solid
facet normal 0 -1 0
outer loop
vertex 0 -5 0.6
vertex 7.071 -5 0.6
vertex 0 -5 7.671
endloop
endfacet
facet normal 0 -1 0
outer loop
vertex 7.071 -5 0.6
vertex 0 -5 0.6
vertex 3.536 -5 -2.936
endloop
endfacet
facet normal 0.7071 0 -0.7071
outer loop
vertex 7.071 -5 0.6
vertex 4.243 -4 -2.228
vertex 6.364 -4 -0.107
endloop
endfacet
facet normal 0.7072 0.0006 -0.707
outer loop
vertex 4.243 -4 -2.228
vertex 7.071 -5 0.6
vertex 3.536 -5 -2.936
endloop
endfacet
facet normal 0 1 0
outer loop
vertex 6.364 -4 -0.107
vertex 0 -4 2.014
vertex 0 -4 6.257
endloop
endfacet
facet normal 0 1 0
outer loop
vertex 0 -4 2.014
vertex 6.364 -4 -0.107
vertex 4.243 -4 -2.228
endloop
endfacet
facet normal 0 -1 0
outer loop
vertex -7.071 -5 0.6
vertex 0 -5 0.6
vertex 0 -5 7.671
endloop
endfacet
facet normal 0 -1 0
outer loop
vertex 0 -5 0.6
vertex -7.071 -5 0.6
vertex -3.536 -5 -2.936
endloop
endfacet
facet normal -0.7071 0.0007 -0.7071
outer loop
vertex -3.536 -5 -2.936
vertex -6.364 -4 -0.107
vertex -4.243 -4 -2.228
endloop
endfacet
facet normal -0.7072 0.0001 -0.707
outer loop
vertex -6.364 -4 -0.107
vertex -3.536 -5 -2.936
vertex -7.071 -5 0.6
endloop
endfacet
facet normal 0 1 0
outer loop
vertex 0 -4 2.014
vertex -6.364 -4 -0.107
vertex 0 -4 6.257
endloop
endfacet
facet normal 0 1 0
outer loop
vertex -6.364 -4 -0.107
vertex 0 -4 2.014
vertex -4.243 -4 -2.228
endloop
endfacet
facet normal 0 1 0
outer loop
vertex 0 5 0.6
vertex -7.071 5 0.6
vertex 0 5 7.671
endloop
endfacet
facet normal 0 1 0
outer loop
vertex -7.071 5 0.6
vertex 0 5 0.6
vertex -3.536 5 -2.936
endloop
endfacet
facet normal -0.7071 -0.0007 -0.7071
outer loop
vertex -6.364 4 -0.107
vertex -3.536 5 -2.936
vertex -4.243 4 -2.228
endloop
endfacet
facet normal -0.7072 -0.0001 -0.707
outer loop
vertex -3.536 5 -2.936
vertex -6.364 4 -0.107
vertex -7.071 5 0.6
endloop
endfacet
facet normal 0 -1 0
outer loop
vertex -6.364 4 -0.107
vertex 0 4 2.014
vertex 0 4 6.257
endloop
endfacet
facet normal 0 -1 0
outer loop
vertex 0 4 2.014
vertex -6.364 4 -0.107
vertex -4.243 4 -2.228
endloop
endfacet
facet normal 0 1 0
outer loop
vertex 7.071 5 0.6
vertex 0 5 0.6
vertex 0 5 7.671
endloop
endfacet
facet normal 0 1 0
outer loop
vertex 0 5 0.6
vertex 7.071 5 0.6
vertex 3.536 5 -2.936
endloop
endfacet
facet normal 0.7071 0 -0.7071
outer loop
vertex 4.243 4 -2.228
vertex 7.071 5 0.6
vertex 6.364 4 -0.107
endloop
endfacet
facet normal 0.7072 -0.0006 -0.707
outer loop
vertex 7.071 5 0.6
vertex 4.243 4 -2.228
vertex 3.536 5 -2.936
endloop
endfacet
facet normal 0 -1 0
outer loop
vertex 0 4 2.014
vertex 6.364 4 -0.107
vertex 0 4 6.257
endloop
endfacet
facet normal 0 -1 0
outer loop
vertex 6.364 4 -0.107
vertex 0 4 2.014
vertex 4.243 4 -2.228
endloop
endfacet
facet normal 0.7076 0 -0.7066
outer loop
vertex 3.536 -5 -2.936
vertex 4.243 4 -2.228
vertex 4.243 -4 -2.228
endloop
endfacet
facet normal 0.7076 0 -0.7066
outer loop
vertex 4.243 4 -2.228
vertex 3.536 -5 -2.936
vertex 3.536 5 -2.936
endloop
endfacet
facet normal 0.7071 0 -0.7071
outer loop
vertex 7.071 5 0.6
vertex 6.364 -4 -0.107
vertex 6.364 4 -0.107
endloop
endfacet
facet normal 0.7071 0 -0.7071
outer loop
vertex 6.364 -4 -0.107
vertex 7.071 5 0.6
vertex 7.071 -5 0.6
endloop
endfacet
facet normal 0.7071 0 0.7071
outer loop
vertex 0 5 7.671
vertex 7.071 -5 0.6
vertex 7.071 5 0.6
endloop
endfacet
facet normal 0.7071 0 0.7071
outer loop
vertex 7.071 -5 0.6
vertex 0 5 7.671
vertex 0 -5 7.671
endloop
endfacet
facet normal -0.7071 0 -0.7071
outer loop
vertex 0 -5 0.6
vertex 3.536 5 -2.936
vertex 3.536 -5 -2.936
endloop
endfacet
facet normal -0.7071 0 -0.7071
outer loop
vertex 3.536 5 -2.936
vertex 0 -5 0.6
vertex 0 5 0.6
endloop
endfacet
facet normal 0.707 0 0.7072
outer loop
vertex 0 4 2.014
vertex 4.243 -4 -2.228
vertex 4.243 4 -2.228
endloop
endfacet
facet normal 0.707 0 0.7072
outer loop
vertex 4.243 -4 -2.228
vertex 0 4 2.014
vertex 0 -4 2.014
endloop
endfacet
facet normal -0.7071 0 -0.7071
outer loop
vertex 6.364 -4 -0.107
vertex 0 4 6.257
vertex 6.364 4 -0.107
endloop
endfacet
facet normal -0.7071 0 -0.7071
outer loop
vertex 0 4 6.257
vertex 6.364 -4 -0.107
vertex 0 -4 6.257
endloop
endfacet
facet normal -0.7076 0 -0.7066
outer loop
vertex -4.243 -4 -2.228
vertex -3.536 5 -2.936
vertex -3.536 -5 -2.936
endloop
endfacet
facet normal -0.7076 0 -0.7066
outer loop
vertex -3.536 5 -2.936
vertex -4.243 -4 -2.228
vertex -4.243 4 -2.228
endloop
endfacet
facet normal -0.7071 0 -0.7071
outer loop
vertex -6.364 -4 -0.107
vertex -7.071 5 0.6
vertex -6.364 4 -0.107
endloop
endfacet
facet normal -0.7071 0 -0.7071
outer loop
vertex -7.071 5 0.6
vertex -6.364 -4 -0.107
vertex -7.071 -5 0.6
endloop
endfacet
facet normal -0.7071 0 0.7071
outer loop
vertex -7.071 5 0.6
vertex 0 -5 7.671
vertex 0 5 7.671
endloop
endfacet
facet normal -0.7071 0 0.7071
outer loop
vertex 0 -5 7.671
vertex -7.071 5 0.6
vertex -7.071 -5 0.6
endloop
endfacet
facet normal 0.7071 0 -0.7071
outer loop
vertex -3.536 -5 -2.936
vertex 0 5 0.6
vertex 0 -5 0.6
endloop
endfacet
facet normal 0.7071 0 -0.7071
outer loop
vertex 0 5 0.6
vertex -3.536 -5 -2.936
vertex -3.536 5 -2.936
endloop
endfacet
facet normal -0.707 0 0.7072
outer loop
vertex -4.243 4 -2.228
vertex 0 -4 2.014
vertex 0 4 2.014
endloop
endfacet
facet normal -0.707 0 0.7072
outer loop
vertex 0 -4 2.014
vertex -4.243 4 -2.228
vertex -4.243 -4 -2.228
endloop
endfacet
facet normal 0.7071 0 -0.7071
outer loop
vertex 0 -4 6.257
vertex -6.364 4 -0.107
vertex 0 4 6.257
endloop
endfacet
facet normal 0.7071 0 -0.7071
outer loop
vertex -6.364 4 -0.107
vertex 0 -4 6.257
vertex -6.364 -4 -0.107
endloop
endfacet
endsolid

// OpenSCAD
// file: s/u7044s01.scad
use <../../lib.scad>
function ldraw_lib__s__u7044s01() = [
// 0 ~Modulex Angled Brick 45 2 x 1 Double - Side
// 0 Name: s\u7044s01.dat
// 0 Author: Magnus Forsberg [MagFors]
// 0 !LDRAW_ORG Subpart UPDATE 2025-09
// 0 !LICENSE Licensed under CC BY 4.0 : see CAreadme.txt
// 
// 0 BFC CERTIFY CCW
  [0,"BFC","CERTIFY"],
  [0,"BFC","CCW"],
// 
// 0 !HISTORY 2025-09-29 [OrionP] Official Update 2025-09
// 
// 4 16 0 -19.177697 0 0 -1.5 0 8.838835 7.338807 0 17.677676 -1.500028 0
  [4,16,0,-19.177697,0,0,-1.5,0,8.838835,7.338807,0,17.677676,-1.500028,0],
// 4 16 8.838835 7.338807 0 10.606609 5.57104 2.5 15.909909 .267739 2.5 17.677676 -1.500028 0
  [4,16,8.838835,7.338807,0,10.606609,5.57104,2.5,15.909909,.267739,2.5,17.677676,-1.500028,0],
// 4 16 0 -5.035568 2.5 0 -15.64217 2.5 15.909909 .267739 2.5 10.606609 5.57104 2.5
  [4,16,0,-5.035568,2.5,0,-15.64217,2.5,15.909909,.267739,2.5,10.606609,5.57104,2.5],
// 2 24 10.606609 5.57104 2.5 15.909909 .267739 2.5
  [2,24,10.606609,5.57104,2.5,15.909909,.267739,2.5],
// 2 24 17.677676 -1.500028 0 8.838835 7.338807 0
  [2,24,17.677676,-1.500028,0,8.838835,7.338807,0],
// 2 24 8.838835 7.338807 0 0 -1.5 0
  [2,24,8.838835,7.338807,0,0,-1.5,0],
// 2 24 0 -5.035568 2.5 10.606609 5.57104 2.5
  [2,24,0,-5.035568,2.5,10.606609,5.57104,2.5],
// 2 24 0 -15.64217 2.5 15.909909 .267739 2.5
  [2,24,0,-15.64217,2.5,15.909909,.267739,2.5],
// 2 24 0 -19.177697 0 17.677676 -1.500028 0
  [2,24,0,-19.177697,0,17.677676,-1.500028,0],
// 4 16 -8.838835 7.338807 0 0 -1.5 0 0 -19.177697 0 -17.677676 -1.500028 0
  [4,16,-8.838835,7.338807,0,0,-1.5,0,0,-19.177697,0,-17.677676,-1.500028,0],
// 4 16 -15.909909 .267739 2.5 -10.606609 5.57104 2.5 -8.838835 7.338807 0 -17.677676 -1.500028 0
  [4,16,-15.909909,.267739,2.5,-10.606609,5.57104,2.5,-8.838835,7.338807,0,-17.677676,-1.500028,0],
// 4 16 -15.909909 .267739 2.5 0 -15.64217 2.5 0 -5.035568 2.5 -10.606609 5.57104 2.5
  [4,16,-15.909909,.267739,2.5,0,-15.64217,2.5,0,-5.035568,2.5,-10.606609,5.57104,2.5],
// 2 24 -15.909909 .267739 2.5 -10.606609 5.57104 2.5
  [2,24,-15.909909,.267739,2.5,-10.606609,5.57104,2.5],
// 2 24 -8.838835 7.338807 0 -17.677676 -1.500028 0
  [2,24,-8.838835,7.338807,0,-17.677676,-1.500028,0],
// 2 24 0 -1.5 0 -8.838835 7.338807 0
  [2,24,0,-1.5,0,-8.838835,7.338807,0],
// 2 24 -10.606609 5.57104 2.5 0 -5.035568 2.5
  [2,24,-10.606609,5.57104,2.5,0,-5.035568,2.5],
// 2 24 -15.909909 .267739 2.5 0 -15.64217 2.5
  [2,24,-15.909909,.267739,2.5,0,-15.64217,2.5],
// 2 24 -17.677676 -1.500028 0 0 -19.177697 0
  [2,24,-17.677676,-1.500028,0,0,-19.177697,0],
];
module ldraw_lib__s__u7044s01(step=0, col=false, unit=2/5, alt=false, line=0.2, solid=!$preview)
    makepoly(ldraw_lib__s__u7044s01(), step=step, col=col, unit=unit, alt=alt, line=line, solid=solid);
ldraw_lib__s__u7044s01(line=0.2);
// main file
use <../lib.scad>
use <s/u7044s01.scad>
function ldraw_lib__u7045() = [
// 0 Modulex Brick Angled 45 2 x 2 Double
// 0 Name: u7045.dat
// 0 Author: Magnus Forsberg [MagFors]
// 0 !LDRAW_ORG Part UPDATE 2025-09
// 0 !LICENSE Licensed under CC BY 4.0 : see CAreadme.txt
// 
// 0 !HELP 1 16 6.25 12.5 0 1 0 0 0 1 0 0 0 1 u7030.dat
// 0 !HELP 1 35 13.258 2.919 0 0 .707 .707 0 .707 -.707 -1 0 0 u7001.dat
// 
// 0 BFC CERTIFY CCW
  [0,"BFC","CERTIFY"],
  [0,"BFC","CCW"],
// 
// 0 !KEYWORDS 45 degree, Bricklink Mx2401B, Rebrickable 2401B, slope 1:1
// 
// 0 !HISTORY 2025-09-29 [OrionP] Official Update 2025-09
// 
// 1 16 0 0 -12.5 1 0 0 0 1 0 0 0 1 s\u7044s01.dat
  [1,16,0,0,-12.5,1,0,0,0,1,0,0,0,1, ldraw_lib__s__u7044s01()],
// 1 16 0 0 12.5 -1 0 0 0 1 0 0 0 -1 s\u7044s01.dat
  [1,16,0,0,12.5,-1,0,0,0,1,0,0,0,-1, ldraw_lib__s__u7044s01()],
// 
// 2 24 0 -5.035568 -10 0 -5.035568 10
  [2,24,0,-5.035568,-10,0,-5.035568,10],
// 2 24 0 -15.64217 10 0 -15.64217 -10
  [2,24,0,-15.64217,10,0,-15.64217,-10],
// 2 24 0 -19.177697 12.5 0 -19.177697 -12.5
  [2,24,0,-19.177697,12.5,0,-19.177697,-12.5],
// 2 24 0 -1.5 -12.5 0 -1.5 12.5
  [2,24,0,-1.5,-12.5,0,-1.5,12.5],
// 
// 4 16 8.838835 7.338807 -12.5 8.838835 7.338807 12.5 10.606609 5.57104 10 10.606609 5.57104 -10
  [4,16,8.838835,7.338807,-12.5,8.838835,7.338807,12.5,10.606609,5.57104,10,10.606609,5.57104,-10],
// 4 16 17.677676 -1.500028 -12.5 15.909909 .267739 -10 15.909909 .267739 10 17.677676 -1.500028 12.5
  [4,16,17.677676,-1.500028,-12.5,15.909909,.267739,-10,15.909909,.267739,10,17.677676,-1.500028,12.5],
// 4 16 17.677676 -1.500028 -12.5 17.677676 -1.500028 12.5 0 -19.177697 12.5 0 -19.177697 -12.5
  [4,16,17.677676,-1.500028,-12.5,17.677676,-1.500028,12.5,0,-19.177697,12.5,0,-19.177697,-12.5],
// 4 16 0 -1.5 12.5 8.838835 7.338807 12.5 8.838835 7.338807 -12.5 0 -1.5 -12.5
  [4,16,0,-1.5,12.5,8.838835,7.338807,12.5,8.838835,7.338807,-12.5,0,-1.5,-12.5],
// 4 16 0 -5.035568 10 0 -5.035568 -10 10.606609 5.57104 -10 10.606609 5.57104 10
  [4,16,0,-5.035568,10,0,-5.035568,-10,10.606609,5.57104,-10,10.606609,5.57104,10],
// 4 16 0 -15.64217 10 15.909909 .267739 10 15.909909 .267739 -10 0 -15.64217 -10
  [4,16,0,-15.64217,10,15.909909,.267739,10,15.909909,.267739,-10,0,-15.64217,-10],
// 2 24 17.677676 -1.500028 -12.5 17.677676 -1.500028 12.5
  [2,24,17.677676,-1.500028,-12.5,17.677676,-1.500028,12.5],
// 2 24 15.909909 .267739 -10 15.909909 .267739 10
  [2,24,15.909909,.267739,-10,15.909909,.267739,10],
// 2 24 8.838835 7.338807 -12.5 8.838835 7.338807 12.5
  [2,24,8.838835,7.338807,-12.5,8.838835,7.338807,12.5],
// 2 24 10.606609 5.57104 10 10.606609 5.57104 -10
  [2,24,10.606609,5.57104,10,10.606609,5.57104,-10],
// 
// 4 16 -10.606609 5.57104 10 -8.838835 7.338807 12.5 -8.838835 7.338807 -12.5 -10.606609 5.57104 -10
  [4,16,-10.606609,5.57104,10,-8.838835,7.338807,12.5,-8.838835,7.338807,-12.5,-10.606609,5.57104,-10],
// 4 16 -15.909909 .267739 10 -15.909909 .267739 -10 -17.677676 -1.500028 -12.5 -17.677676 -1.500028 12.5
  [4,16,-15.909909,.267739,10,-15.909909,.267739,-10,-17.677676,-1.500028,-12.5,-17.677676,-1.500028,12.5],
// 4 16 0 -19.177697 12.5 -17.677676 -1.500028 12.5 -17.677676 -1.500028 -12.5 0 -19.177697 -12.5
  [4,16,0,-19.177697,12.5,-17.677676,-1.500028,12.5,-17.677676,-1.500028,-12.5,0,-19.177697,-12.5],
// 4 16 -8.838835 7.338807 -12.5 -8.838835 7.338807 12.5 0 -1.5 12.5 0 -1.5 -12.5
  [4,16,-8.838835,7.338807,-12.5,-8.838835,7.338807,12.5,0,-1.5,12.5,0,-1.5,-12.5],
// 4 16 -10.606609 5.57104 -10 0 -5.035568 -10 0 -5.035568 10 -10.606609 5.57104 10
  [4,16,-10.606609,5.57104,-10,0,-5.035568,-10,0,-5.035568,10,-10.606609,5.57104,10],
// 4 16 -15.909909 .267739 -10 -15.909909 .267739 10 0 -15.64217 10 0 -15.64217 -10
  [4,16,-15.909909,.267739,-10,-15.909909,.267739,10,0,-15.64217,10,0,-15.64217,-10],
// 2 24 -17.677676 -1.500028 12.5 -17.677676 -1.500028 -12.5
  [2,24,-17.677676,-1.500028,12.5,-17.677676,-1.500028,-12.5],
// 2 24 -15.909909 .267739 10 -15.909909 .267739 -10
  [2,24,-15.909909,.267739,10,-15.909909,.267739,-10],
// 2 24 -8.838835 7.338807 12.5 -8.838835 7.338807 -12.5
  [2,24,-8.838835,7.338807,12.5,-8.838835,7.338807,-12.5],
// 2 24 -10.606609 5.57104 -10 -10.606609 5.57104 10
  [2,24,-10.606609,5.57104,-10,-10.606609,5.57104,10],
];
module ldraw_lib__u7045(step=0, col=false, unit=2/5, alt=false, line=0.2, solid=!$preview)
    makepoly(ldraw_lib__u7045(), step=step, col=col, unit=unit, alt=alt, line=line, solid=solid);
ldraw_lib__u7045(line=0.2);
